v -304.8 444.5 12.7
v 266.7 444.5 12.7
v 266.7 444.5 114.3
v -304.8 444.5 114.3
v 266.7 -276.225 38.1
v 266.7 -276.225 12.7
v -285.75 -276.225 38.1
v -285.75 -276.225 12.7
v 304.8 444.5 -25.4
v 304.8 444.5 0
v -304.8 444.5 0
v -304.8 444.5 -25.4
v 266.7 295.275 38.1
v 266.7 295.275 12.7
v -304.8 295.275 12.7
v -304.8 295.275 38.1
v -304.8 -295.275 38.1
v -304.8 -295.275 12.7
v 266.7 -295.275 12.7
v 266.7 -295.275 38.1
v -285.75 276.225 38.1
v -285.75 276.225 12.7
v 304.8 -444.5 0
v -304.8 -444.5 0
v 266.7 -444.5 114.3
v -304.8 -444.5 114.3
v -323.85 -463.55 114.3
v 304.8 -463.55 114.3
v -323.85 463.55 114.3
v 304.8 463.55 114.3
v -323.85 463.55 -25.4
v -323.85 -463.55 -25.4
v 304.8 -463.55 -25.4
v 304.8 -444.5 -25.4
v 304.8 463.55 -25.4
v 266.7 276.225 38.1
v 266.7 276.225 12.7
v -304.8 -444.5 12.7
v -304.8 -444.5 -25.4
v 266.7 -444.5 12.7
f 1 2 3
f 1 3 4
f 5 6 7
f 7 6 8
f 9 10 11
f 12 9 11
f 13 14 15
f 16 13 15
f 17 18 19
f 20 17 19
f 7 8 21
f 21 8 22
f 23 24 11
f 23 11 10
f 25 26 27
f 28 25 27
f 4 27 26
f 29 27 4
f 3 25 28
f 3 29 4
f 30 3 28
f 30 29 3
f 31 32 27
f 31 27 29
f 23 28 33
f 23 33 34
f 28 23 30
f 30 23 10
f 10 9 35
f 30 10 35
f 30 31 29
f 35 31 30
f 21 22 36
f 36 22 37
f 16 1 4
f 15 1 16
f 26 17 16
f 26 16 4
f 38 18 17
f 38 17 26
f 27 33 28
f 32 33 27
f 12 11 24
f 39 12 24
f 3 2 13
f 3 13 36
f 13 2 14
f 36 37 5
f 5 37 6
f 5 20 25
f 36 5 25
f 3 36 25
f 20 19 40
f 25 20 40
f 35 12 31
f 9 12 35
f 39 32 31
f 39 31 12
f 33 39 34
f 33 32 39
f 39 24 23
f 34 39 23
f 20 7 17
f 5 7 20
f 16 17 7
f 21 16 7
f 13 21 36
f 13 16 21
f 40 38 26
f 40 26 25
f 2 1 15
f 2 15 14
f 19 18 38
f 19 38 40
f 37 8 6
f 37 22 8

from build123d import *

# Parameters (mm, degrees)
F0_W          = 609.6
F0_H          = 889
F1_DEPTH      = 12.7
F3_DEPTH      = 25.4
F5_DEPTH      = 25.4
F5_DEPTH_BACK = 114.3
F7_DEPTH      = 101.6


with BuildPart() as f1:
    # F0 (on Top) → F1 (new body)
    with BuildSketch(Plane.XY):
        Rectangle(F0_W, F0_H)
    extrude(amount=F1_DEPTH)

    # F2 (on face) → F3 (join)
    with BuildSketch(Plane.XY.offset(12.7)):
        Polygon((-285.75, -276.225), (-285.75, 276.225), (266.7, 276.225), (266.7, 295.275), (-304.8, 295.275), (-304.8, -295.275), (266.7, -295.275), (266.7, -276.225), align=None)
    extrude(amount=F3_DEPTH)

    # F4 (on face) → F5 (join, two sides)
    with BuildSketch(Plane(origin=(0, 0, 0), x_dir=(1, 0, 0), z_dir=(0, 0, -1))) as f5_sk:
        Polygon((-304.8, 444.5), (304.8, 444.5), (304.8, 463.55), (-323.85, 463.55), (-323.85, -463.55), (304.8, -463.55), (304.8, -444.5), (-304.8, -444.5), align=None)
    extrude(amount=F5_DEPTH)
    extrude(f5_sk.sketch, amount=-F5_DEPTH_BACK)

    # F6 (on face) → F7 (join, through all)
    with BuildSketch(Plane.XY.offset(12.7)):
        Polygon((304.8, -444.5), (304.8, 444.5), (266.7, 444.5), (266.7, 295.275), (266.7, 276.225), (266.7, -276.225), (266.7, -295.275), (266.7, -444.5), align=None)
    extrude(amount=F7_DEPTH)


solid = f1.part
